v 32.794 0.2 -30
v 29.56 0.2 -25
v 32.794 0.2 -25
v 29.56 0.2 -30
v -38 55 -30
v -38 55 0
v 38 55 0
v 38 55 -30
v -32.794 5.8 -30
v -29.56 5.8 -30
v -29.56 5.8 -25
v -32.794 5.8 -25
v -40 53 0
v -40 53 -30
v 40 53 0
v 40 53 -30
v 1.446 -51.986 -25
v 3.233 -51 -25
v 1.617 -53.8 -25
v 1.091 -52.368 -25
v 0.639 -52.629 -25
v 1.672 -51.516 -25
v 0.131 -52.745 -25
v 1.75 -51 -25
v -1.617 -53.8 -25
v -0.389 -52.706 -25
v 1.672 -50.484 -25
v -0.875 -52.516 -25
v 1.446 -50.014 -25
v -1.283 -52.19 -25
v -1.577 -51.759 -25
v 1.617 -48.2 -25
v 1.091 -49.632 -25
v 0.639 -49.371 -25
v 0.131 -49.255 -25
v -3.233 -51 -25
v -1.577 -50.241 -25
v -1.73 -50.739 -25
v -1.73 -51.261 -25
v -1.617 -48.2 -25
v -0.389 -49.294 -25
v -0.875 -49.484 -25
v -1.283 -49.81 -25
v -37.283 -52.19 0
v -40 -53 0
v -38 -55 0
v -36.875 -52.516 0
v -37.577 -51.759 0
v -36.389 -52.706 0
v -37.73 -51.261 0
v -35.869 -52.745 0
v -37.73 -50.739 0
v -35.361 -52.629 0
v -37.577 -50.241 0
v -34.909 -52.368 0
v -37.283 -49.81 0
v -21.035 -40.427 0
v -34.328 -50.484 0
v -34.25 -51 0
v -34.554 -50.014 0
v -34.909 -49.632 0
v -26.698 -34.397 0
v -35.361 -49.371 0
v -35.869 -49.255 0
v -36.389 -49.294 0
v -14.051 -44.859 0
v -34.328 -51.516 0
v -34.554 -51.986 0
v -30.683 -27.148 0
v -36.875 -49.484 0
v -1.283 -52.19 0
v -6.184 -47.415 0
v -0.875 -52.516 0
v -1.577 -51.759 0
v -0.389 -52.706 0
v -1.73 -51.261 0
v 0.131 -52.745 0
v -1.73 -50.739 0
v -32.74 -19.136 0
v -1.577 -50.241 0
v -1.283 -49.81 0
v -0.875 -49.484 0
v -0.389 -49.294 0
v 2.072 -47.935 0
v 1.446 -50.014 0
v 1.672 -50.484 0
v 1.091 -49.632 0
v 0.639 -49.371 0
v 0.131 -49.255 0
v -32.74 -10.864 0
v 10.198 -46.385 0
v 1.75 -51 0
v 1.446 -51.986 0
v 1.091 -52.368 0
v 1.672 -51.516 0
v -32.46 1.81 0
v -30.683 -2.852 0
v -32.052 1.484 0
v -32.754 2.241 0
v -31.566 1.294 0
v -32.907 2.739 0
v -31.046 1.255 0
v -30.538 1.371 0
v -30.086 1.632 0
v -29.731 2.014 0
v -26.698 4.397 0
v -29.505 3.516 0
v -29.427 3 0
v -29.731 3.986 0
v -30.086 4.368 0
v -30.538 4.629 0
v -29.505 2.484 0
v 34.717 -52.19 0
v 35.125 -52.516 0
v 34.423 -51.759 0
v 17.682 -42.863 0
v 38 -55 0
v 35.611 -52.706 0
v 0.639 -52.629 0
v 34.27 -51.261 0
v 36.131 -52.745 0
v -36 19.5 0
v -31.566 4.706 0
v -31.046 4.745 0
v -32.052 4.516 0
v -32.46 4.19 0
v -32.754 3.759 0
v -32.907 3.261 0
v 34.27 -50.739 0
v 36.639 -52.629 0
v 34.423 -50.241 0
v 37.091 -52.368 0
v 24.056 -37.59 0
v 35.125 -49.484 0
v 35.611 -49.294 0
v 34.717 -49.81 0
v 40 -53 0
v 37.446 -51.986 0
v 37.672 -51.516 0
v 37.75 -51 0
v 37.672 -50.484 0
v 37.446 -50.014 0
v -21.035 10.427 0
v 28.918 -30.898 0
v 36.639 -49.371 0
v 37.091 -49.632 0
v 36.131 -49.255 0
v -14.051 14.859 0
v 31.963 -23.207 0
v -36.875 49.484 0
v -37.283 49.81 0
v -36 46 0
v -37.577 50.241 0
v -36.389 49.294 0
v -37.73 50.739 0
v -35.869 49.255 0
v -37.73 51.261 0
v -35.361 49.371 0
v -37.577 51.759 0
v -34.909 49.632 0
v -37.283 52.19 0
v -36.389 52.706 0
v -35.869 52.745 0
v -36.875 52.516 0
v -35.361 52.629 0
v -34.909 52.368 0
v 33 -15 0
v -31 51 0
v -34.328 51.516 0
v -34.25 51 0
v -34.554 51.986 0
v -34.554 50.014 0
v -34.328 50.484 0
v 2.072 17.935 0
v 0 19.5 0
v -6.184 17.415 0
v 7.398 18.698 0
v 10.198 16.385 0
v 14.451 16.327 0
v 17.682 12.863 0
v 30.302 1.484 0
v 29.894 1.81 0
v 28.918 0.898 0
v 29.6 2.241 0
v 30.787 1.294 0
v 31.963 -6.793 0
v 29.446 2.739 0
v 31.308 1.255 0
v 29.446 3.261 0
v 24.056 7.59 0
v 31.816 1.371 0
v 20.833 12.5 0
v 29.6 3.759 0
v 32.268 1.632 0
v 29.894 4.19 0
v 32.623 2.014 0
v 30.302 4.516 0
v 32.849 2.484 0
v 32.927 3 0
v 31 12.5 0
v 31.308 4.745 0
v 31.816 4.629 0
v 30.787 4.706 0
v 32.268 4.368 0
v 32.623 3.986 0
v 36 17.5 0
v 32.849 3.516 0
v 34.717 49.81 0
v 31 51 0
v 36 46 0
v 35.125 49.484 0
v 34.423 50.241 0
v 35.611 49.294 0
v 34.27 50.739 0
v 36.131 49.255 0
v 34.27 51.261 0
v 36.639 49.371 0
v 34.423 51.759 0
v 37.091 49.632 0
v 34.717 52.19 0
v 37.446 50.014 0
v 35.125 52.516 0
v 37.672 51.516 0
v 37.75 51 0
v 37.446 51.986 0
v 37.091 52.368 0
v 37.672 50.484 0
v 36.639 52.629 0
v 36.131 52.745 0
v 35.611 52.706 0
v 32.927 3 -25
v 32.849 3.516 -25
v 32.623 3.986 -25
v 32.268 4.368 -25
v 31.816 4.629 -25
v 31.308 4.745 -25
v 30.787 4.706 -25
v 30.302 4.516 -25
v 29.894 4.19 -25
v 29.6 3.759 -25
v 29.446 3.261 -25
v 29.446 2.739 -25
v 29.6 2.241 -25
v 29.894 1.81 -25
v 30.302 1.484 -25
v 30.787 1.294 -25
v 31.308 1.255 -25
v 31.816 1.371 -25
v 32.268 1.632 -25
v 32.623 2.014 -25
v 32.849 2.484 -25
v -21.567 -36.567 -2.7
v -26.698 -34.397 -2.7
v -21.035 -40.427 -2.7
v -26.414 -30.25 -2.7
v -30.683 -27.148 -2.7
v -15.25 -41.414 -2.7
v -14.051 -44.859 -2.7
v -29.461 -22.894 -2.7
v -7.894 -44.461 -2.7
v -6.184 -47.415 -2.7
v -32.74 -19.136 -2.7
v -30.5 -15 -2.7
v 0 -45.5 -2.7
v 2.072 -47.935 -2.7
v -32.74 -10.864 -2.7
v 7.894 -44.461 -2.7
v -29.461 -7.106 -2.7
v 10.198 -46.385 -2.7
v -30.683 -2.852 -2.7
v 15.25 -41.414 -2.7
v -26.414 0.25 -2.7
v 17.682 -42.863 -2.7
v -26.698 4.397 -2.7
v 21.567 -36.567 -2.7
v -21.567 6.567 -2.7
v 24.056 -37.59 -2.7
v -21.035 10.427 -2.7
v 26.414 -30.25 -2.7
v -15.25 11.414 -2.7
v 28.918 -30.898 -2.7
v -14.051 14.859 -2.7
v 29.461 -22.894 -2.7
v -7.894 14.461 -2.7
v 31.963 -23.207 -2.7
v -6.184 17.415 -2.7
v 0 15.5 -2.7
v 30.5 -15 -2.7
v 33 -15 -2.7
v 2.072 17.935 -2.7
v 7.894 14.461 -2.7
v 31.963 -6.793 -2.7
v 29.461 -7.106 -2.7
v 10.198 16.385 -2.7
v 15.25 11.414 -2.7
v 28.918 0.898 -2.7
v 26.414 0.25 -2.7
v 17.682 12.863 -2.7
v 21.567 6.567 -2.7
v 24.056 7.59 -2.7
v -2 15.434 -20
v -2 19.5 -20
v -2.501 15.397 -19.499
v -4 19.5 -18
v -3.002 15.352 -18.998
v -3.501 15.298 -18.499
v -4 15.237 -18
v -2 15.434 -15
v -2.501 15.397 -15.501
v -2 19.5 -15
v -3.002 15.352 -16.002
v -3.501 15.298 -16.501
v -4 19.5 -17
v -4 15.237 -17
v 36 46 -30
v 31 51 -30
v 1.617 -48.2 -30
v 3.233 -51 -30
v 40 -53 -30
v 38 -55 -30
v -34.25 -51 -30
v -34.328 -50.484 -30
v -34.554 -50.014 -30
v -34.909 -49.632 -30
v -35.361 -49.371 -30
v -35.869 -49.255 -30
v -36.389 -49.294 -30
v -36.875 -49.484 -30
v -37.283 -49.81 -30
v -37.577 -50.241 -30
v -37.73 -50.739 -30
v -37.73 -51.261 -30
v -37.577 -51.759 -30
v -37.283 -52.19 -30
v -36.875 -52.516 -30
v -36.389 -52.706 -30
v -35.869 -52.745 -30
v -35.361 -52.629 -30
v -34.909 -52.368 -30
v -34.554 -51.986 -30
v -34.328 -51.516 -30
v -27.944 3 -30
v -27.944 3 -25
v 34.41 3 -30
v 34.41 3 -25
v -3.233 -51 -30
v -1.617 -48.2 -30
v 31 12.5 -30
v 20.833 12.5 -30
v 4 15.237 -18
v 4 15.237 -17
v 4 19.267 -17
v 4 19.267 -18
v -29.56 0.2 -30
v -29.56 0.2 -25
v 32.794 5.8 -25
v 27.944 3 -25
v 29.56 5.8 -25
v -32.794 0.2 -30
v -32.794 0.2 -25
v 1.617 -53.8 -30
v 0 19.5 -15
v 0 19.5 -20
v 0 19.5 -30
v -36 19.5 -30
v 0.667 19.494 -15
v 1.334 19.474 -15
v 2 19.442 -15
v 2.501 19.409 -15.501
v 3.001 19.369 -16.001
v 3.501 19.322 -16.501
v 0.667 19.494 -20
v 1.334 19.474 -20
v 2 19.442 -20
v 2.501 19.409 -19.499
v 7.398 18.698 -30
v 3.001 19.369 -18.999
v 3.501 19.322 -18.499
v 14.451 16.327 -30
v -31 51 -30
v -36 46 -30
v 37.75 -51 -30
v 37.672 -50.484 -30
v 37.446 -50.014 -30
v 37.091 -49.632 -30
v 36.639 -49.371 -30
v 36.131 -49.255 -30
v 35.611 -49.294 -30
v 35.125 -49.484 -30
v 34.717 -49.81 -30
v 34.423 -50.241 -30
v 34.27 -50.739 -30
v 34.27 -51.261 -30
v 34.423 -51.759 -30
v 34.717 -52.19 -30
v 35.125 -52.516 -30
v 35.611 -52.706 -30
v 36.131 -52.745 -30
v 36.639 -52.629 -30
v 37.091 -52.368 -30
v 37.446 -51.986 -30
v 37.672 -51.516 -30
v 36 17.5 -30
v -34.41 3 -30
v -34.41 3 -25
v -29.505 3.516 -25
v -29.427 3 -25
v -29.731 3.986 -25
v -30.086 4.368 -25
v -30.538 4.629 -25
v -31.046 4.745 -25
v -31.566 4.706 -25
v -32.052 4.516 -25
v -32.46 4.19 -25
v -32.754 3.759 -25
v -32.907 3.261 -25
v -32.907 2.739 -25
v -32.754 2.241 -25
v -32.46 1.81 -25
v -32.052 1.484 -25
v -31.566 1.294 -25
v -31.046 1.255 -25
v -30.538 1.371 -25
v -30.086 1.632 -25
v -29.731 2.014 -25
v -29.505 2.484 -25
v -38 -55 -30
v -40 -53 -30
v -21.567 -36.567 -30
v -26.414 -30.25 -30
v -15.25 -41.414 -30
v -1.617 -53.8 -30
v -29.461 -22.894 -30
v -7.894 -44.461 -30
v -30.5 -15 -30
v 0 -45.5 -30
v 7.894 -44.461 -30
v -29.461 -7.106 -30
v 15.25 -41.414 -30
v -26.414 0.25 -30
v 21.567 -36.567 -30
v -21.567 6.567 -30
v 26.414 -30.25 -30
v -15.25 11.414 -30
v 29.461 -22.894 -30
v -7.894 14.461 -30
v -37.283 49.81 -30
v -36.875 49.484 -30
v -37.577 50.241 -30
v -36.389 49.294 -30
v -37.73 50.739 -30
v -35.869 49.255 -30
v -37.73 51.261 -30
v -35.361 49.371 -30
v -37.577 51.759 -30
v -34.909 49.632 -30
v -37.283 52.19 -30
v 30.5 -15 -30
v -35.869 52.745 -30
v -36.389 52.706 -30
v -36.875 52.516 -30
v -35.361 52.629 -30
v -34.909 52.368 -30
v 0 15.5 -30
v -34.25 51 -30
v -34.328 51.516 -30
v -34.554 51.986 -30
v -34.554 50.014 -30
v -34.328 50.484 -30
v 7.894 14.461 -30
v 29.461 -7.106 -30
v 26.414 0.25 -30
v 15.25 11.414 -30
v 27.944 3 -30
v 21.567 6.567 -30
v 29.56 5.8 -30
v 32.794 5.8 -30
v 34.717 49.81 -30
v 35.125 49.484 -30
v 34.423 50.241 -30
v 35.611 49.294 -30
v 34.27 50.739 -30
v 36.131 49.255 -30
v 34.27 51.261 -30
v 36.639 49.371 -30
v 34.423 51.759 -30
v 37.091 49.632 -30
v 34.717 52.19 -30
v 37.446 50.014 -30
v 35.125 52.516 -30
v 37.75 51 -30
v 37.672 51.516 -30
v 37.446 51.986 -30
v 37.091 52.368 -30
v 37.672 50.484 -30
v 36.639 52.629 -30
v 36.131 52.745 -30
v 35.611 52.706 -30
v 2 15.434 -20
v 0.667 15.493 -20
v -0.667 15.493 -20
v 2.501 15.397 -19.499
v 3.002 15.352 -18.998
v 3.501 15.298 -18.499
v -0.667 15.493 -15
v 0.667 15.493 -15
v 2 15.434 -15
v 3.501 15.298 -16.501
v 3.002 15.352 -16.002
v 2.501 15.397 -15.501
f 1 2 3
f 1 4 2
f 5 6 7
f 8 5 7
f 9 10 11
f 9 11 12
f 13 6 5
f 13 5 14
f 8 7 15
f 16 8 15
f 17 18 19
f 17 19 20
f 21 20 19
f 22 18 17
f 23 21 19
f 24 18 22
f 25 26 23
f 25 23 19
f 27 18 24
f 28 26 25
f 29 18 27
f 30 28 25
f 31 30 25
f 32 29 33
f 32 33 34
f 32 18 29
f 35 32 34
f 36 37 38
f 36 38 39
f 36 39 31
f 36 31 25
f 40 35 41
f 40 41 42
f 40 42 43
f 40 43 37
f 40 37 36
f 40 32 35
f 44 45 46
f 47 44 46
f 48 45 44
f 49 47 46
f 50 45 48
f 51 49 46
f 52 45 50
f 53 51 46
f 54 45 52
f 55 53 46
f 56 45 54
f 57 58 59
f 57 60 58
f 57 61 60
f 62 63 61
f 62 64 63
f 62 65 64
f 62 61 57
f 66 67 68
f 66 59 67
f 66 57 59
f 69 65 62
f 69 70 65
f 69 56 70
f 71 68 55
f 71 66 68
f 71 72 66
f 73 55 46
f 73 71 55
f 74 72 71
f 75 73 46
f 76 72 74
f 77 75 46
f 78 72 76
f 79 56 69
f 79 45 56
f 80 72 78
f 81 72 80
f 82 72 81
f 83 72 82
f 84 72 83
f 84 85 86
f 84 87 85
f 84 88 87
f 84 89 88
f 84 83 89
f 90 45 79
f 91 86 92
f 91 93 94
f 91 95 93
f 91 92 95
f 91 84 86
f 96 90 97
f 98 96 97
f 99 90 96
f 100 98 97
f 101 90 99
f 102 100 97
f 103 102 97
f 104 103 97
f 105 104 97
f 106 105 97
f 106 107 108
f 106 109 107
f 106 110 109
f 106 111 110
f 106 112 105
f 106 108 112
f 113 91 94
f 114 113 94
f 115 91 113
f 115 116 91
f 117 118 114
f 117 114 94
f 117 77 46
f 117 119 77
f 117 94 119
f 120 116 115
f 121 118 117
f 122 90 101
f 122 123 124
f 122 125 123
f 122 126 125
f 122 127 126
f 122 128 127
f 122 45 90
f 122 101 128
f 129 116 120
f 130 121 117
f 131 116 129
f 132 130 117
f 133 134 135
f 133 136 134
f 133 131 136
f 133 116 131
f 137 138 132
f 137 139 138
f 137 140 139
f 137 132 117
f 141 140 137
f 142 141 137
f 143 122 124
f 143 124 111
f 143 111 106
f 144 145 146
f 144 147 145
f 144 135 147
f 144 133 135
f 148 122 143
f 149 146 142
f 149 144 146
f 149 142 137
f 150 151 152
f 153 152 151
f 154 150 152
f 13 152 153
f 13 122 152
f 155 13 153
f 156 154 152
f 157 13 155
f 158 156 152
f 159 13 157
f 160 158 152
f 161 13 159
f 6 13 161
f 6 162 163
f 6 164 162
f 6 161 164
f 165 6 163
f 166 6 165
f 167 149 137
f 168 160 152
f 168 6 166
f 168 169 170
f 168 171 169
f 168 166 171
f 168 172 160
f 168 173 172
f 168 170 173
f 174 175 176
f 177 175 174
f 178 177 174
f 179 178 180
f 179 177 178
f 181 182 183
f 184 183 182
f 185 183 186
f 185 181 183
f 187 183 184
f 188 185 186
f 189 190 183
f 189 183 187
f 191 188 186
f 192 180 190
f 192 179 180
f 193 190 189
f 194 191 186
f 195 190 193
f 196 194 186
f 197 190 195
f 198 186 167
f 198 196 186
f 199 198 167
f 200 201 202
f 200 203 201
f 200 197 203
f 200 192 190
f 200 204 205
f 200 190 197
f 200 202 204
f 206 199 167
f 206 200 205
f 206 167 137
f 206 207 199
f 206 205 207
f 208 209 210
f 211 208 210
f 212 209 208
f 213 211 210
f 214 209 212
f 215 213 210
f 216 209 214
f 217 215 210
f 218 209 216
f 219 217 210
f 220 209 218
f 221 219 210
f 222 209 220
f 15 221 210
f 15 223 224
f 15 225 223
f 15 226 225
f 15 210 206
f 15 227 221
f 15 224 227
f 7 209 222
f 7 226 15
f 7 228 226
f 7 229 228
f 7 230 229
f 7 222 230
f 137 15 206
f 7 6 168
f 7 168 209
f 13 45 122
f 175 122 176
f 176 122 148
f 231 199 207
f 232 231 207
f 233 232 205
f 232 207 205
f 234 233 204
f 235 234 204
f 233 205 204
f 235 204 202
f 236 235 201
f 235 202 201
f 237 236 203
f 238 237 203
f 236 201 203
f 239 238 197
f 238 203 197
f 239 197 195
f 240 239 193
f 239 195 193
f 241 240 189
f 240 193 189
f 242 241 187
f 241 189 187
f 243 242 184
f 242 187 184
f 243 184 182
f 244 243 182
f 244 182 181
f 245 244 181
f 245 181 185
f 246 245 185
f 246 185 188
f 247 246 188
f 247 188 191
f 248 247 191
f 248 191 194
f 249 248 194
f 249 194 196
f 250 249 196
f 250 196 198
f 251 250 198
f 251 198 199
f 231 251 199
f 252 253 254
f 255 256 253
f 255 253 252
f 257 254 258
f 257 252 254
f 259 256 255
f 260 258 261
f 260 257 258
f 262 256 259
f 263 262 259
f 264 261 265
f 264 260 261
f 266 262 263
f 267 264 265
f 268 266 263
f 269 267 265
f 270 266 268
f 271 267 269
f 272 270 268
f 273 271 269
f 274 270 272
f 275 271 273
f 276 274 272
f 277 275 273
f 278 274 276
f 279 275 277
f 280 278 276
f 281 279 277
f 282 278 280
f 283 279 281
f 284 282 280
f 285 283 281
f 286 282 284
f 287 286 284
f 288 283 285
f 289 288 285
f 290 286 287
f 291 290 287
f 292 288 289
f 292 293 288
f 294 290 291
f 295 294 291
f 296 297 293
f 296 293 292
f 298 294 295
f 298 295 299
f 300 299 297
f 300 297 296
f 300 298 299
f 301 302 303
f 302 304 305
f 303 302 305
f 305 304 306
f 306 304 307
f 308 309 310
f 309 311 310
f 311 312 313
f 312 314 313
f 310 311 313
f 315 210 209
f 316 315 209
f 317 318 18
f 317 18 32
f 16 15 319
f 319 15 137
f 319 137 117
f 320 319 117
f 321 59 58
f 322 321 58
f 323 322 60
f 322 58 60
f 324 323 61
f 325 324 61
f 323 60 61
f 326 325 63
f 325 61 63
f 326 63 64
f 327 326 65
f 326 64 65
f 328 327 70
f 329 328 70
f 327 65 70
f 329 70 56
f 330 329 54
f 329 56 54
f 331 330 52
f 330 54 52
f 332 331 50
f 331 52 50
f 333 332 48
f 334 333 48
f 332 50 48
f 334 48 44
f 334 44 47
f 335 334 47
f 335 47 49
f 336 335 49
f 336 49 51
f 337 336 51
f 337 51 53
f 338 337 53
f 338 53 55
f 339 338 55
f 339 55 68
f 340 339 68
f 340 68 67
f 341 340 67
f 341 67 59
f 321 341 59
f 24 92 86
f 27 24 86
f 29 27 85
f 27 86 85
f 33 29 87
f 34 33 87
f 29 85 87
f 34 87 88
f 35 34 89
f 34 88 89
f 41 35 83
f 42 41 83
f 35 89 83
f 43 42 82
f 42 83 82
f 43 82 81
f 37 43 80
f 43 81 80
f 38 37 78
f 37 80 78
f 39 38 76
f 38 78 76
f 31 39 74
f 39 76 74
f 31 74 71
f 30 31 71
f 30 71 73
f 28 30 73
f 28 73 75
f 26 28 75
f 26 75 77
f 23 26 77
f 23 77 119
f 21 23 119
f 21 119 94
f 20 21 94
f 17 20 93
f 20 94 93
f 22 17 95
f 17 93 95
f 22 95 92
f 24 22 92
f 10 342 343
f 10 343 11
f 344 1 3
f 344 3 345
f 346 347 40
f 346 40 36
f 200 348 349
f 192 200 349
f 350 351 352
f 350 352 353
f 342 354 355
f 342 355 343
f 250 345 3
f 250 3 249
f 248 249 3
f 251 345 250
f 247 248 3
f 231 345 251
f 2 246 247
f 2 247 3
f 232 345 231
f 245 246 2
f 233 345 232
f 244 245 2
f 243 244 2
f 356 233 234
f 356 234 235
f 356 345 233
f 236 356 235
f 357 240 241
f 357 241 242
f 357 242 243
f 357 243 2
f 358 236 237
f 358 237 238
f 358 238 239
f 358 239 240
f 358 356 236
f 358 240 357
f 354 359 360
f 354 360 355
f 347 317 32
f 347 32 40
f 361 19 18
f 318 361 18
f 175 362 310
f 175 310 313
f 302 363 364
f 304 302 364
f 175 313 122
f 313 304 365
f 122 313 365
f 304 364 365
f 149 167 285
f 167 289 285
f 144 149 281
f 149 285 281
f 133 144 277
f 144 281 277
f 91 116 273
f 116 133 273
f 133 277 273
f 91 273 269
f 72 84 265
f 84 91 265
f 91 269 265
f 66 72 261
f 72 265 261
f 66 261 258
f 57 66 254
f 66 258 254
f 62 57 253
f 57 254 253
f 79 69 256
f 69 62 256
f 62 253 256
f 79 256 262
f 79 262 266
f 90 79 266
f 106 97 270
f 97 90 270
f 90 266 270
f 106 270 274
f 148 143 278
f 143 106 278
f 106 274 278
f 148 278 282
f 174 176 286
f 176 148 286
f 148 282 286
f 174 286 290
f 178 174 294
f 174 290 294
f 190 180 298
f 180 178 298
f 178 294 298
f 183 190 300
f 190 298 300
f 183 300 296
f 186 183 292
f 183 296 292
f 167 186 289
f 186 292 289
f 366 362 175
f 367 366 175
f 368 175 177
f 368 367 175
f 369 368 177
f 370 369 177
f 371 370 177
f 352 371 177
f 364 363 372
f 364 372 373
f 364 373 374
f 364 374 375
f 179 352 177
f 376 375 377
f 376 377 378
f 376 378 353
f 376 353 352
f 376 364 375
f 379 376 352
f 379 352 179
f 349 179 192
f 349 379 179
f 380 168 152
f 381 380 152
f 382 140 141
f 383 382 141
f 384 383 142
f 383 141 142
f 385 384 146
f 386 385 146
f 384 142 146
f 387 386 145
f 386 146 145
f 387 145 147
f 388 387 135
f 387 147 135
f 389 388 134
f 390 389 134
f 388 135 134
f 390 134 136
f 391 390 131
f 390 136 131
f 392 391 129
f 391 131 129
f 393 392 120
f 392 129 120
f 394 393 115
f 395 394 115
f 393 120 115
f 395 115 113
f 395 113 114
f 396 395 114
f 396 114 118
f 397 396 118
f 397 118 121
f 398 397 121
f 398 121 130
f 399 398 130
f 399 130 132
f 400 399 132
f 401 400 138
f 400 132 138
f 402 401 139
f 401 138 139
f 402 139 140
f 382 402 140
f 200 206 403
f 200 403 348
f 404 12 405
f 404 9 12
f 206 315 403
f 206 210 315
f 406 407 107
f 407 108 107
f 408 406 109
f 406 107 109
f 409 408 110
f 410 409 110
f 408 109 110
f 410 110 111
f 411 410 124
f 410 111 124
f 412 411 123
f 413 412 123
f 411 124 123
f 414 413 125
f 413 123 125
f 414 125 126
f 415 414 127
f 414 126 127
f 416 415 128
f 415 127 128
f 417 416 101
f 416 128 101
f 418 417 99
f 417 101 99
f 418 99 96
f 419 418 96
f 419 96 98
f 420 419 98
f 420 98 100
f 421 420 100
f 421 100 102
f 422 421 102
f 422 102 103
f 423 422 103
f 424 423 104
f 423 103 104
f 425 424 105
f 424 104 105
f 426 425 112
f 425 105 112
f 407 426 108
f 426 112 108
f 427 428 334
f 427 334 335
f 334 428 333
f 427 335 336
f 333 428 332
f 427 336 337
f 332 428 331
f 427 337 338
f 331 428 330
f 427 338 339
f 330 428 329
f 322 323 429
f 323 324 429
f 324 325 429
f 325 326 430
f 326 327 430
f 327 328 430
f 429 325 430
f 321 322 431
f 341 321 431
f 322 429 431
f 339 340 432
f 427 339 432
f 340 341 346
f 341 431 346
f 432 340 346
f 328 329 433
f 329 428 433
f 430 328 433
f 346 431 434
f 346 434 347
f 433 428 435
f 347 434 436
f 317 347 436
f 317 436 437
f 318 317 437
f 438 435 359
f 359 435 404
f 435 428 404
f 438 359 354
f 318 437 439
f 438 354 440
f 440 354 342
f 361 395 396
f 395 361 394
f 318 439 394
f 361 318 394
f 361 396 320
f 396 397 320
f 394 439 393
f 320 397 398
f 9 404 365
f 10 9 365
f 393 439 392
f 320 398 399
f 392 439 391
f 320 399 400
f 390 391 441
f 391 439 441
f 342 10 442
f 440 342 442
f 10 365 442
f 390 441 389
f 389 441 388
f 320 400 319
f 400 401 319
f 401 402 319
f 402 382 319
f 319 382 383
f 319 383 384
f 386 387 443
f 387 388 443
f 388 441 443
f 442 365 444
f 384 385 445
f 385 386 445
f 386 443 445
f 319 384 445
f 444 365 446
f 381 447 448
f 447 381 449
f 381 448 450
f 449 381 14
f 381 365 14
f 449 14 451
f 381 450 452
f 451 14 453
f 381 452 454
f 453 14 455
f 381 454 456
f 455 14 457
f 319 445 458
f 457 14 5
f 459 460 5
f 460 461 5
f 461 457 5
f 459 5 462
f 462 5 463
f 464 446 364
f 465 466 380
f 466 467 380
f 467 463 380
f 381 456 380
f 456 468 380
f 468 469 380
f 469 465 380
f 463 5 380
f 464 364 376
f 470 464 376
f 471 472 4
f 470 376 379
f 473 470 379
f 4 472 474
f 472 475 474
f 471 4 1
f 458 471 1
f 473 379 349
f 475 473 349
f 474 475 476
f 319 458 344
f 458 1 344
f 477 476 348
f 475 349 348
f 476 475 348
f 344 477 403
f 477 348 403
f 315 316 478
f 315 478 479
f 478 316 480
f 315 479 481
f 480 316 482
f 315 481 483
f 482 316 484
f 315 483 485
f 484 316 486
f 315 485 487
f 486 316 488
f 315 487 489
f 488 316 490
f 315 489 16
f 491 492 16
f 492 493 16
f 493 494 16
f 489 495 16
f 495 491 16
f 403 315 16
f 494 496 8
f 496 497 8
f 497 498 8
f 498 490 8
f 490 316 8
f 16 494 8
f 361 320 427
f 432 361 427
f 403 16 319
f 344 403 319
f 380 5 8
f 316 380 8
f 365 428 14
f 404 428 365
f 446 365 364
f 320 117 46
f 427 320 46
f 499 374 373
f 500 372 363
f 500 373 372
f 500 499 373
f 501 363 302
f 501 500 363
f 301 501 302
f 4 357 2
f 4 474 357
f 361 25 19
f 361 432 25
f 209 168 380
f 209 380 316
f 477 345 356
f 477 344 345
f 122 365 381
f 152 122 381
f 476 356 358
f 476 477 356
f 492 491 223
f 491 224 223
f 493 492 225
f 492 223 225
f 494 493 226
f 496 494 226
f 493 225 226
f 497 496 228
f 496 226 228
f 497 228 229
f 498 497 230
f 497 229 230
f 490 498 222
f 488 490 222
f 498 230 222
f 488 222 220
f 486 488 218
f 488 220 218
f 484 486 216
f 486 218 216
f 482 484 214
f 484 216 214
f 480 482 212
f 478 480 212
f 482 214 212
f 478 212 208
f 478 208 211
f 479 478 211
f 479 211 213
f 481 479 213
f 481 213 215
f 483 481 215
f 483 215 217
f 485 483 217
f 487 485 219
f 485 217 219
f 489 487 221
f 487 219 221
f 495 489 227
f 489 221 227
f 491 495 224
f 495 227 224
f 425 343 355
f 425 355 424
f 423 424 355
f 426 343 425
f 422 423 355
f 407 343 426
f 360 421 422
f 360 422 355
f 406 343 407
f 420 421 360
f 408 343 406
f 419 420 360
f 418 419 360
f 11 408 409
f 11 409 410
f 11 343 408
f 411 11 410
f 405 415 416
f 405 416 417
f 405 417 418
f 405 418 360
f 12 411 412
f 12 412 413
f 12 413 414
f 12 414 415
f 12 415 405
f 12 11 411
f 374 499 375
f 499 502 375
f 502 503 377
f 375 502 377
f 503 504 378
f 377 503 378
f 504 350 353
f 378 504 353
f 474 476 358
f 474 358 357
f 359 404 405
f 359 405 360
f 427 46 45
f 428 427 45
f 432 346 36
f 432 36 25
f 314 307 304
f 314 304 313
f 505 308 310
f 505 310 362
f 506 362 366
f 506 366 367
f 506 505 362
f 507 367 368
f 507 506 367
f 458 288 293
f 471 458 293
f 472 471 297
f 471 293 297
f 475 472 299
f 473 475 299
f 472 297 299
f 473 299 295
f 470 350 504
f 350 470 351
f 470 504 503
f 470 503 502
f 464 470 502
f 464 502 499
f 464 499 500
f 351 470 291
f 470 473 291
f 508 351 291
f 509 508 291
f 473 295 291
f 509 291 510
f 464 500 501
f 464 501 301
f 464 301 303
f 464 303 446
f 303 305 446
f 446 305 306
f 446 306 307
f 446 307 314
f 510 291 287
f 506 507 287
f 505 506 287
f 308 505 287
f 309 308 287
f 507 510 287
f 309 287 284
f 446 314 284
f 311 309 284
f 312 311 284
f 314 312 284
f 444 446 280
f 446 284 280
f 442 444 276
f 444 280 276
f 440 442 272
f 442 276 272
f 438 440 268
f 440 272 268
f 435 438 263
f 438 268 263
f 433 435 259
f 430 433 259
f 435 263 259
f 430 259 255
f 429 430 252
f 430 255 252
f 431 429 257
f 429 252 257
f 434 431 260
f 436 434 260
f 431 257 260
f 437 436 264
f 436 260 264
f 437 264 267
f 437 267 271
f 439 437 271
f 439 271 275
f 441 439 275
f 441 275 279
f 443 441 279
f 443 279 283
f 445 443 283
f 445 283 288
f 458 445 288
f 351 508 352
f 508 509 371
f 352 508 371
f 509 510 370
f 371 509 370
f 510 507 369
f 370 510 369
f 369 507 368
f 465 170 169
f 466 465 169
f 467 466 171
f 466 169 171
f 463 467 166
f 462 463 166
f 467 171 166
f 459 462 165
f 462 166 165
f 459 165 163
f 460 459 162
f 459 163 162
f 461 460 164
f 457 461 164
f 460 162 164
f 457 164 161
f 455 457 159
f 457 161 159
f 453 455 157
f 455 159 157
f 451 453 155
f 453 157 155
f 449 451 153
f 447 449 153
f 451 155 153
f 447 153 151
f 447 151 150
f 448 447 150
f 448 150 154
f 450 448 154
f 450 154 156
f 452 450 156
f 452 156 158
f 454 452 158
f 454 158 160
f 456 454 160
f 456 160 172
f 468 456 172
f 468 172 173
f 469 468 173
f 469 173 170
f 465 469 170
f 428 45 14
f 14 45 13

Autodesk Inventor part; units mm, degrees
ref_plane "YZ Plane" through (0, 0, 0) normal (1, 0, 0) x (0, 1, 0)
ref_plane "XZ Plane" through (0, 0, 0) normal (0, 1, 0) x (-1, 0, 0)
sketch "スケッチ1" plane through (0, 0, 0) normal (0, 0, 1) x (1, 0, 0)
  line L0 (38, -55) -> (-38, -55)
  line L1 (-40, -53) -> (-40, 53)
  line L2 (-38, 55) -> (38, 55)
  line L3 (40, 53) -> (40, -53)
  line L4 (40, -55) -> (-40, 55) construction
  line L5 (-40, -55) -> (40, 55) construction
  line L6 (-38, 55) -> (-40, 53)
  line L7 (38, 55) -> (40, 53)
  line L8 (40, -53) -> (38, -55)
  line L9 (-38, -55) -> (-40, -53)
  circle A0 centre (-36, 51) radius 1.75
  line L10 (-56, 0) -> (56, 0) construction
  line L11 (0, -77) -> (0, 77) construction
  circle A1 centre (36, 51) radius 1.75
  circle A2 centre (-36, -51) radius 1.75
  circle A3 centre (36, -51) radius 1.75
  line L12 (31, -51) -> (-31, -51)
  line L13 (-36, -46) -> (-36, 46)
  line L14 (-31, 51) -> (31, 51)
  line L15 (36, 46) -> (36, -46)
  line L16 (36, -51) -> (-36, 51) construction
  line L17 (-36, -51) -> (36, 51) construction
  line L18 (-31, 51) -> (-36, 46)
  line L19 (36, 46) -> (31, 51)
  line L20 (-31, -51) -> (-36, -46)
  line L21 (31, -51) -> (36, -46)
  point P0 (0, 0)
  dimension "d1" = 80
  dimension "d2" = 110
  dimension "d3" = 2
  dimension "d4" = 2
  dimension "d5" = 2
  dimension "d6" = 2
  dimension "d7" = 2
  dimension "d8" = 2
  dimension "d9" = 2
  dimension "d10" = 2
  dimension "d11" = 3.5
  dimension "d12" = 4
  dimension "d13" = 4
  dimension "d14" = 4
  dimension "d15" = 4
  dimension "d16" = 5
  dimension "d17" = 5
  dimension "d18" = 5
  dimension "d19" = 5
  dimension "d20" = 5
  dimension "d21" = 5
  dimension "d22" = 5
  dimension "d23" = 5
extrude "押し出し1" add sketch "スケッチ1" against normal blind 30
ref_plane "作業平面1" through (0, 0, -2.7) normal (0, 0, 1) x (1, 0, 0)
sketch "スケッチ2" plane through (0, 0, -2.7) normal (0, 0, 1) x (1, 0, 0)
  line L0 (-56, 0) -> (56, 0) construction
  line L1 (0, -77) -> (0, 77) construction
  circle A0 centre (0, -15) radius 36 construction
  line L2 (31, -51) -> (-31, -51) projected
  circle A1 centre (0, -15) radius 30.5
  line L3 (-36, 20) -> (4, 20) construction
  line L4 (4, 20) -> (4, 36) construction
  line L5 (4, 36) -> (-36, 36) construction
  line L6 (-36, 36) -> (-36, 20) construction
  line L7 (-36, 20) -> (4, 36) construction
  line L8 (4, 20) -> (-36, 36) construction
  line L9 (-36, 46) -> (-31, 51) construction
  line L10 (-31, 51) -> (31, 51) construction
  line L11 (31, 51) -> (36, 46) construction
  line L12 (36, 46) -> (36, -46) construction
  line L13 (36, -46) -> (31, -51) projected
  line L14 (-31, -51) -> (-36, -46) projected
  line L15 (-36, -46) -> (-36, 46) construction
  circle A2 centre (25, 25) radius 12.5 construction
  circle A3 centre (0, -15) radius 34.5 construction
  line L16 (0, 19.5) -> (-36, 19.5)
  arc A4 (20.8327, 12.5) -> (0, 19.5) centre (0, -15) ccw
  line L17 (20.8327, 12.5) -> (31, 12.5)
  line L18 (-36, 19.5) -> (-36, -46)
  line L19 (36, 17.5) -> (36, -46)
  line L20 (31, 12.5) -> (36, 17.5)
  point P0 (0, 0)
  point P1 (-16, 28)
  point P2 (36, 12.5)
  dimension "d27" = 72
  dimension "d28" = 61
  dimension "d29" = 35
  dimension "d30" = 4
  dimension "d31" = 40
  dimension "d32" = 16
  dimension "d33" = 4
  dimension "d34" = 25
  dimension "d35" = 40
  dimension "d36" = 25
  dimension "d39" = 5
  dimension "d40" = 5
extrude "押し出し2" add sketch "スケッチ2" against normal up to surface (27.3 mm away)
sketch "スケッチ3" plane through (0, 0, -2.7) normal (0, 0, 1) x (1, 0, 0)
  line L0 (0, 19.5) -> (-36, 19.5) projected
  line L1 (-36, -46) -> (-36, 19.5) projected
  line L2 (-31, -51) -> (-36, -46) projected
  line L3 (31, -51) -> (-31, -51) projected
  line L4 (36, -46) -> (31, -51) projected
  line L5 (36, 17.5) -> (36, -46) projected
  line L6 (36, 17.5) -> (31, 12.5) projected
  line L7 (31, 12.5) -> (20.8327, 12.5) projected
  arc A0 (20.8327, 12.5) -> (0, 19.5) centre (0, -15) ccw projected
  circle A1 centre (0, -15) radius 30.5 construction
  circle A2 centre (0, -15) radius 33
  point P0 (0, 0)
  dimension "d41" = 66
extrude "押し出し3" add sketch "スケッチ3" along normal up to surface (2.7 mm away)
sketch "スケッチ4" plane through (0, 0, 0) normal (0, 0, 1) x (1, 0, 0)
  circle A0 centre (0, -15) radius 30.5 construction
  circle A1 centre (0, -15) radius 36 construction
  line L0 (0, -77) -> (0, 77) construction
  circle A2 centre (0, -51) radius 1.75
  circle A3 centre (31.1769, 3) radius 1.75
  circle A4 centre (-31.1769, 3) radius 1.75
  point P0 (0, 0)
  dimension "d44" = 72
  dimension "d45" = 3.5
  dimension "d48" = 360
extrude "押し出し4" cut sketch "スケッチ4" against normal through all
sketch "スケッチ5" plane through (0, 0, -30) normal (0, 0, -1) x (-1, 0, 0)
  circle A0 centre (-31.1769, 3) radius 1.75 construction
  circle A1 centre (31.1769, 3) radius 1.75 construction
  circle A2 centre (0, -51) radius 1.75 construction
  line L0 (-29.5603, 5.8) -> (-27.9438, 3)
  line L1 (-27.9438, 3) -> (-29.5603, 0.2)
  line L2 (-29.5603, 0.2) -> (-32.7935, 0.2)
  line L3 (-32.7935, 0.2) -> (-34.4101, 3)
  line L4 (-34.4101, 3) -> (-32.7935, 5.8)
  line L5 (-32.7935, 5.8) -> (-29.5603, 5.8)
  line L6 (32.7935, 5.8) -> (34.4101, 3)
  line L7 (34.4101, 3) -> (32.7935, 0.2)
  line L8 (32.7935, 0.2) -> (29.5603, 0.2)
  line L9 (29.5603, 0.2) -> (27.9438, 3)
  line L10 (27.9438, 3) -> (29.5603, 5.8)
  line L11 (29.5603, 5.8) -> (32.7935, 5.8)
  line L12 (1.6166, -48.2) -> (3.2332, -51)
  line L13 (3.2332, -51) -> (1.6166, -53.8)
  line L14 (1.6166, -53.8) -> (-1.6166, -53.8)
  line L15 (-1.6166, -53.8) -> (-3.2332, -51)
  line L16 (-3.2332, -51) -> (-1.6166, -48.2)
  line L17 (-1.6166, -48.2) -> (1.6166, -48.2)
  point P0 (0, 0)
  dimension "d52" = 5.6
extrude "押し出し5" cut sketch "スケッチ5" against normal blind 5
sketch "スケッチ6" plane through (0, 0, 0) normal (0, 1, 0) x (-1, 0, 0)
  line L0 (-4, -20) -> (4, -20)
  line L1 (4, -20) -> (4, -15)
  line L2 (4, -15) -> (-4, -15)
  line L3 (-4, -15) -> (-4, -20)
  line L4 (-4, -20) -> (4, -15) construction
  line L5 (4, -20) -> (-4, -15) construction
  line L6 (0, -62.7735) -> (0, 10.4622) construction
  line L7 (56, 0) -> (-56, 0) construction
  point P0 (0, 0)
  point P1 (0, -17.5)
  dimension "d55" = 5
  dimension "d56" = 8
  dimension "d57" = 17.5
extrude "押し出し6" cut sketch "スケッチ6" along normal up to surface (19.5 mm away)
chamfer "面取り1" distance 2 angle 45 4 edges at (-4, 17.3683, -20) (-4, 17.3683, -15) (4, 17.2519, -15) (4, 17.2519, -20)
equation "\"d4\" = d3"
equation "\"d5\" = d3"
equation "\"d6\" = d5"
equation "\"d7\" = d3"
equation "\"d8\" = d7"
equation "\"d9\" = d3"
equation "\"d10\" = d9"
equation "\"d17\" = d16"
equation "\"d19\" = d18"
equation "\"d20\" = d18"
equation "\"d21\" = d20"
equation "\"d22\" = d18"
equation "\"d23\" = d22"
equation "\"d40\" = d39"
properties part number "housing_3dp"
